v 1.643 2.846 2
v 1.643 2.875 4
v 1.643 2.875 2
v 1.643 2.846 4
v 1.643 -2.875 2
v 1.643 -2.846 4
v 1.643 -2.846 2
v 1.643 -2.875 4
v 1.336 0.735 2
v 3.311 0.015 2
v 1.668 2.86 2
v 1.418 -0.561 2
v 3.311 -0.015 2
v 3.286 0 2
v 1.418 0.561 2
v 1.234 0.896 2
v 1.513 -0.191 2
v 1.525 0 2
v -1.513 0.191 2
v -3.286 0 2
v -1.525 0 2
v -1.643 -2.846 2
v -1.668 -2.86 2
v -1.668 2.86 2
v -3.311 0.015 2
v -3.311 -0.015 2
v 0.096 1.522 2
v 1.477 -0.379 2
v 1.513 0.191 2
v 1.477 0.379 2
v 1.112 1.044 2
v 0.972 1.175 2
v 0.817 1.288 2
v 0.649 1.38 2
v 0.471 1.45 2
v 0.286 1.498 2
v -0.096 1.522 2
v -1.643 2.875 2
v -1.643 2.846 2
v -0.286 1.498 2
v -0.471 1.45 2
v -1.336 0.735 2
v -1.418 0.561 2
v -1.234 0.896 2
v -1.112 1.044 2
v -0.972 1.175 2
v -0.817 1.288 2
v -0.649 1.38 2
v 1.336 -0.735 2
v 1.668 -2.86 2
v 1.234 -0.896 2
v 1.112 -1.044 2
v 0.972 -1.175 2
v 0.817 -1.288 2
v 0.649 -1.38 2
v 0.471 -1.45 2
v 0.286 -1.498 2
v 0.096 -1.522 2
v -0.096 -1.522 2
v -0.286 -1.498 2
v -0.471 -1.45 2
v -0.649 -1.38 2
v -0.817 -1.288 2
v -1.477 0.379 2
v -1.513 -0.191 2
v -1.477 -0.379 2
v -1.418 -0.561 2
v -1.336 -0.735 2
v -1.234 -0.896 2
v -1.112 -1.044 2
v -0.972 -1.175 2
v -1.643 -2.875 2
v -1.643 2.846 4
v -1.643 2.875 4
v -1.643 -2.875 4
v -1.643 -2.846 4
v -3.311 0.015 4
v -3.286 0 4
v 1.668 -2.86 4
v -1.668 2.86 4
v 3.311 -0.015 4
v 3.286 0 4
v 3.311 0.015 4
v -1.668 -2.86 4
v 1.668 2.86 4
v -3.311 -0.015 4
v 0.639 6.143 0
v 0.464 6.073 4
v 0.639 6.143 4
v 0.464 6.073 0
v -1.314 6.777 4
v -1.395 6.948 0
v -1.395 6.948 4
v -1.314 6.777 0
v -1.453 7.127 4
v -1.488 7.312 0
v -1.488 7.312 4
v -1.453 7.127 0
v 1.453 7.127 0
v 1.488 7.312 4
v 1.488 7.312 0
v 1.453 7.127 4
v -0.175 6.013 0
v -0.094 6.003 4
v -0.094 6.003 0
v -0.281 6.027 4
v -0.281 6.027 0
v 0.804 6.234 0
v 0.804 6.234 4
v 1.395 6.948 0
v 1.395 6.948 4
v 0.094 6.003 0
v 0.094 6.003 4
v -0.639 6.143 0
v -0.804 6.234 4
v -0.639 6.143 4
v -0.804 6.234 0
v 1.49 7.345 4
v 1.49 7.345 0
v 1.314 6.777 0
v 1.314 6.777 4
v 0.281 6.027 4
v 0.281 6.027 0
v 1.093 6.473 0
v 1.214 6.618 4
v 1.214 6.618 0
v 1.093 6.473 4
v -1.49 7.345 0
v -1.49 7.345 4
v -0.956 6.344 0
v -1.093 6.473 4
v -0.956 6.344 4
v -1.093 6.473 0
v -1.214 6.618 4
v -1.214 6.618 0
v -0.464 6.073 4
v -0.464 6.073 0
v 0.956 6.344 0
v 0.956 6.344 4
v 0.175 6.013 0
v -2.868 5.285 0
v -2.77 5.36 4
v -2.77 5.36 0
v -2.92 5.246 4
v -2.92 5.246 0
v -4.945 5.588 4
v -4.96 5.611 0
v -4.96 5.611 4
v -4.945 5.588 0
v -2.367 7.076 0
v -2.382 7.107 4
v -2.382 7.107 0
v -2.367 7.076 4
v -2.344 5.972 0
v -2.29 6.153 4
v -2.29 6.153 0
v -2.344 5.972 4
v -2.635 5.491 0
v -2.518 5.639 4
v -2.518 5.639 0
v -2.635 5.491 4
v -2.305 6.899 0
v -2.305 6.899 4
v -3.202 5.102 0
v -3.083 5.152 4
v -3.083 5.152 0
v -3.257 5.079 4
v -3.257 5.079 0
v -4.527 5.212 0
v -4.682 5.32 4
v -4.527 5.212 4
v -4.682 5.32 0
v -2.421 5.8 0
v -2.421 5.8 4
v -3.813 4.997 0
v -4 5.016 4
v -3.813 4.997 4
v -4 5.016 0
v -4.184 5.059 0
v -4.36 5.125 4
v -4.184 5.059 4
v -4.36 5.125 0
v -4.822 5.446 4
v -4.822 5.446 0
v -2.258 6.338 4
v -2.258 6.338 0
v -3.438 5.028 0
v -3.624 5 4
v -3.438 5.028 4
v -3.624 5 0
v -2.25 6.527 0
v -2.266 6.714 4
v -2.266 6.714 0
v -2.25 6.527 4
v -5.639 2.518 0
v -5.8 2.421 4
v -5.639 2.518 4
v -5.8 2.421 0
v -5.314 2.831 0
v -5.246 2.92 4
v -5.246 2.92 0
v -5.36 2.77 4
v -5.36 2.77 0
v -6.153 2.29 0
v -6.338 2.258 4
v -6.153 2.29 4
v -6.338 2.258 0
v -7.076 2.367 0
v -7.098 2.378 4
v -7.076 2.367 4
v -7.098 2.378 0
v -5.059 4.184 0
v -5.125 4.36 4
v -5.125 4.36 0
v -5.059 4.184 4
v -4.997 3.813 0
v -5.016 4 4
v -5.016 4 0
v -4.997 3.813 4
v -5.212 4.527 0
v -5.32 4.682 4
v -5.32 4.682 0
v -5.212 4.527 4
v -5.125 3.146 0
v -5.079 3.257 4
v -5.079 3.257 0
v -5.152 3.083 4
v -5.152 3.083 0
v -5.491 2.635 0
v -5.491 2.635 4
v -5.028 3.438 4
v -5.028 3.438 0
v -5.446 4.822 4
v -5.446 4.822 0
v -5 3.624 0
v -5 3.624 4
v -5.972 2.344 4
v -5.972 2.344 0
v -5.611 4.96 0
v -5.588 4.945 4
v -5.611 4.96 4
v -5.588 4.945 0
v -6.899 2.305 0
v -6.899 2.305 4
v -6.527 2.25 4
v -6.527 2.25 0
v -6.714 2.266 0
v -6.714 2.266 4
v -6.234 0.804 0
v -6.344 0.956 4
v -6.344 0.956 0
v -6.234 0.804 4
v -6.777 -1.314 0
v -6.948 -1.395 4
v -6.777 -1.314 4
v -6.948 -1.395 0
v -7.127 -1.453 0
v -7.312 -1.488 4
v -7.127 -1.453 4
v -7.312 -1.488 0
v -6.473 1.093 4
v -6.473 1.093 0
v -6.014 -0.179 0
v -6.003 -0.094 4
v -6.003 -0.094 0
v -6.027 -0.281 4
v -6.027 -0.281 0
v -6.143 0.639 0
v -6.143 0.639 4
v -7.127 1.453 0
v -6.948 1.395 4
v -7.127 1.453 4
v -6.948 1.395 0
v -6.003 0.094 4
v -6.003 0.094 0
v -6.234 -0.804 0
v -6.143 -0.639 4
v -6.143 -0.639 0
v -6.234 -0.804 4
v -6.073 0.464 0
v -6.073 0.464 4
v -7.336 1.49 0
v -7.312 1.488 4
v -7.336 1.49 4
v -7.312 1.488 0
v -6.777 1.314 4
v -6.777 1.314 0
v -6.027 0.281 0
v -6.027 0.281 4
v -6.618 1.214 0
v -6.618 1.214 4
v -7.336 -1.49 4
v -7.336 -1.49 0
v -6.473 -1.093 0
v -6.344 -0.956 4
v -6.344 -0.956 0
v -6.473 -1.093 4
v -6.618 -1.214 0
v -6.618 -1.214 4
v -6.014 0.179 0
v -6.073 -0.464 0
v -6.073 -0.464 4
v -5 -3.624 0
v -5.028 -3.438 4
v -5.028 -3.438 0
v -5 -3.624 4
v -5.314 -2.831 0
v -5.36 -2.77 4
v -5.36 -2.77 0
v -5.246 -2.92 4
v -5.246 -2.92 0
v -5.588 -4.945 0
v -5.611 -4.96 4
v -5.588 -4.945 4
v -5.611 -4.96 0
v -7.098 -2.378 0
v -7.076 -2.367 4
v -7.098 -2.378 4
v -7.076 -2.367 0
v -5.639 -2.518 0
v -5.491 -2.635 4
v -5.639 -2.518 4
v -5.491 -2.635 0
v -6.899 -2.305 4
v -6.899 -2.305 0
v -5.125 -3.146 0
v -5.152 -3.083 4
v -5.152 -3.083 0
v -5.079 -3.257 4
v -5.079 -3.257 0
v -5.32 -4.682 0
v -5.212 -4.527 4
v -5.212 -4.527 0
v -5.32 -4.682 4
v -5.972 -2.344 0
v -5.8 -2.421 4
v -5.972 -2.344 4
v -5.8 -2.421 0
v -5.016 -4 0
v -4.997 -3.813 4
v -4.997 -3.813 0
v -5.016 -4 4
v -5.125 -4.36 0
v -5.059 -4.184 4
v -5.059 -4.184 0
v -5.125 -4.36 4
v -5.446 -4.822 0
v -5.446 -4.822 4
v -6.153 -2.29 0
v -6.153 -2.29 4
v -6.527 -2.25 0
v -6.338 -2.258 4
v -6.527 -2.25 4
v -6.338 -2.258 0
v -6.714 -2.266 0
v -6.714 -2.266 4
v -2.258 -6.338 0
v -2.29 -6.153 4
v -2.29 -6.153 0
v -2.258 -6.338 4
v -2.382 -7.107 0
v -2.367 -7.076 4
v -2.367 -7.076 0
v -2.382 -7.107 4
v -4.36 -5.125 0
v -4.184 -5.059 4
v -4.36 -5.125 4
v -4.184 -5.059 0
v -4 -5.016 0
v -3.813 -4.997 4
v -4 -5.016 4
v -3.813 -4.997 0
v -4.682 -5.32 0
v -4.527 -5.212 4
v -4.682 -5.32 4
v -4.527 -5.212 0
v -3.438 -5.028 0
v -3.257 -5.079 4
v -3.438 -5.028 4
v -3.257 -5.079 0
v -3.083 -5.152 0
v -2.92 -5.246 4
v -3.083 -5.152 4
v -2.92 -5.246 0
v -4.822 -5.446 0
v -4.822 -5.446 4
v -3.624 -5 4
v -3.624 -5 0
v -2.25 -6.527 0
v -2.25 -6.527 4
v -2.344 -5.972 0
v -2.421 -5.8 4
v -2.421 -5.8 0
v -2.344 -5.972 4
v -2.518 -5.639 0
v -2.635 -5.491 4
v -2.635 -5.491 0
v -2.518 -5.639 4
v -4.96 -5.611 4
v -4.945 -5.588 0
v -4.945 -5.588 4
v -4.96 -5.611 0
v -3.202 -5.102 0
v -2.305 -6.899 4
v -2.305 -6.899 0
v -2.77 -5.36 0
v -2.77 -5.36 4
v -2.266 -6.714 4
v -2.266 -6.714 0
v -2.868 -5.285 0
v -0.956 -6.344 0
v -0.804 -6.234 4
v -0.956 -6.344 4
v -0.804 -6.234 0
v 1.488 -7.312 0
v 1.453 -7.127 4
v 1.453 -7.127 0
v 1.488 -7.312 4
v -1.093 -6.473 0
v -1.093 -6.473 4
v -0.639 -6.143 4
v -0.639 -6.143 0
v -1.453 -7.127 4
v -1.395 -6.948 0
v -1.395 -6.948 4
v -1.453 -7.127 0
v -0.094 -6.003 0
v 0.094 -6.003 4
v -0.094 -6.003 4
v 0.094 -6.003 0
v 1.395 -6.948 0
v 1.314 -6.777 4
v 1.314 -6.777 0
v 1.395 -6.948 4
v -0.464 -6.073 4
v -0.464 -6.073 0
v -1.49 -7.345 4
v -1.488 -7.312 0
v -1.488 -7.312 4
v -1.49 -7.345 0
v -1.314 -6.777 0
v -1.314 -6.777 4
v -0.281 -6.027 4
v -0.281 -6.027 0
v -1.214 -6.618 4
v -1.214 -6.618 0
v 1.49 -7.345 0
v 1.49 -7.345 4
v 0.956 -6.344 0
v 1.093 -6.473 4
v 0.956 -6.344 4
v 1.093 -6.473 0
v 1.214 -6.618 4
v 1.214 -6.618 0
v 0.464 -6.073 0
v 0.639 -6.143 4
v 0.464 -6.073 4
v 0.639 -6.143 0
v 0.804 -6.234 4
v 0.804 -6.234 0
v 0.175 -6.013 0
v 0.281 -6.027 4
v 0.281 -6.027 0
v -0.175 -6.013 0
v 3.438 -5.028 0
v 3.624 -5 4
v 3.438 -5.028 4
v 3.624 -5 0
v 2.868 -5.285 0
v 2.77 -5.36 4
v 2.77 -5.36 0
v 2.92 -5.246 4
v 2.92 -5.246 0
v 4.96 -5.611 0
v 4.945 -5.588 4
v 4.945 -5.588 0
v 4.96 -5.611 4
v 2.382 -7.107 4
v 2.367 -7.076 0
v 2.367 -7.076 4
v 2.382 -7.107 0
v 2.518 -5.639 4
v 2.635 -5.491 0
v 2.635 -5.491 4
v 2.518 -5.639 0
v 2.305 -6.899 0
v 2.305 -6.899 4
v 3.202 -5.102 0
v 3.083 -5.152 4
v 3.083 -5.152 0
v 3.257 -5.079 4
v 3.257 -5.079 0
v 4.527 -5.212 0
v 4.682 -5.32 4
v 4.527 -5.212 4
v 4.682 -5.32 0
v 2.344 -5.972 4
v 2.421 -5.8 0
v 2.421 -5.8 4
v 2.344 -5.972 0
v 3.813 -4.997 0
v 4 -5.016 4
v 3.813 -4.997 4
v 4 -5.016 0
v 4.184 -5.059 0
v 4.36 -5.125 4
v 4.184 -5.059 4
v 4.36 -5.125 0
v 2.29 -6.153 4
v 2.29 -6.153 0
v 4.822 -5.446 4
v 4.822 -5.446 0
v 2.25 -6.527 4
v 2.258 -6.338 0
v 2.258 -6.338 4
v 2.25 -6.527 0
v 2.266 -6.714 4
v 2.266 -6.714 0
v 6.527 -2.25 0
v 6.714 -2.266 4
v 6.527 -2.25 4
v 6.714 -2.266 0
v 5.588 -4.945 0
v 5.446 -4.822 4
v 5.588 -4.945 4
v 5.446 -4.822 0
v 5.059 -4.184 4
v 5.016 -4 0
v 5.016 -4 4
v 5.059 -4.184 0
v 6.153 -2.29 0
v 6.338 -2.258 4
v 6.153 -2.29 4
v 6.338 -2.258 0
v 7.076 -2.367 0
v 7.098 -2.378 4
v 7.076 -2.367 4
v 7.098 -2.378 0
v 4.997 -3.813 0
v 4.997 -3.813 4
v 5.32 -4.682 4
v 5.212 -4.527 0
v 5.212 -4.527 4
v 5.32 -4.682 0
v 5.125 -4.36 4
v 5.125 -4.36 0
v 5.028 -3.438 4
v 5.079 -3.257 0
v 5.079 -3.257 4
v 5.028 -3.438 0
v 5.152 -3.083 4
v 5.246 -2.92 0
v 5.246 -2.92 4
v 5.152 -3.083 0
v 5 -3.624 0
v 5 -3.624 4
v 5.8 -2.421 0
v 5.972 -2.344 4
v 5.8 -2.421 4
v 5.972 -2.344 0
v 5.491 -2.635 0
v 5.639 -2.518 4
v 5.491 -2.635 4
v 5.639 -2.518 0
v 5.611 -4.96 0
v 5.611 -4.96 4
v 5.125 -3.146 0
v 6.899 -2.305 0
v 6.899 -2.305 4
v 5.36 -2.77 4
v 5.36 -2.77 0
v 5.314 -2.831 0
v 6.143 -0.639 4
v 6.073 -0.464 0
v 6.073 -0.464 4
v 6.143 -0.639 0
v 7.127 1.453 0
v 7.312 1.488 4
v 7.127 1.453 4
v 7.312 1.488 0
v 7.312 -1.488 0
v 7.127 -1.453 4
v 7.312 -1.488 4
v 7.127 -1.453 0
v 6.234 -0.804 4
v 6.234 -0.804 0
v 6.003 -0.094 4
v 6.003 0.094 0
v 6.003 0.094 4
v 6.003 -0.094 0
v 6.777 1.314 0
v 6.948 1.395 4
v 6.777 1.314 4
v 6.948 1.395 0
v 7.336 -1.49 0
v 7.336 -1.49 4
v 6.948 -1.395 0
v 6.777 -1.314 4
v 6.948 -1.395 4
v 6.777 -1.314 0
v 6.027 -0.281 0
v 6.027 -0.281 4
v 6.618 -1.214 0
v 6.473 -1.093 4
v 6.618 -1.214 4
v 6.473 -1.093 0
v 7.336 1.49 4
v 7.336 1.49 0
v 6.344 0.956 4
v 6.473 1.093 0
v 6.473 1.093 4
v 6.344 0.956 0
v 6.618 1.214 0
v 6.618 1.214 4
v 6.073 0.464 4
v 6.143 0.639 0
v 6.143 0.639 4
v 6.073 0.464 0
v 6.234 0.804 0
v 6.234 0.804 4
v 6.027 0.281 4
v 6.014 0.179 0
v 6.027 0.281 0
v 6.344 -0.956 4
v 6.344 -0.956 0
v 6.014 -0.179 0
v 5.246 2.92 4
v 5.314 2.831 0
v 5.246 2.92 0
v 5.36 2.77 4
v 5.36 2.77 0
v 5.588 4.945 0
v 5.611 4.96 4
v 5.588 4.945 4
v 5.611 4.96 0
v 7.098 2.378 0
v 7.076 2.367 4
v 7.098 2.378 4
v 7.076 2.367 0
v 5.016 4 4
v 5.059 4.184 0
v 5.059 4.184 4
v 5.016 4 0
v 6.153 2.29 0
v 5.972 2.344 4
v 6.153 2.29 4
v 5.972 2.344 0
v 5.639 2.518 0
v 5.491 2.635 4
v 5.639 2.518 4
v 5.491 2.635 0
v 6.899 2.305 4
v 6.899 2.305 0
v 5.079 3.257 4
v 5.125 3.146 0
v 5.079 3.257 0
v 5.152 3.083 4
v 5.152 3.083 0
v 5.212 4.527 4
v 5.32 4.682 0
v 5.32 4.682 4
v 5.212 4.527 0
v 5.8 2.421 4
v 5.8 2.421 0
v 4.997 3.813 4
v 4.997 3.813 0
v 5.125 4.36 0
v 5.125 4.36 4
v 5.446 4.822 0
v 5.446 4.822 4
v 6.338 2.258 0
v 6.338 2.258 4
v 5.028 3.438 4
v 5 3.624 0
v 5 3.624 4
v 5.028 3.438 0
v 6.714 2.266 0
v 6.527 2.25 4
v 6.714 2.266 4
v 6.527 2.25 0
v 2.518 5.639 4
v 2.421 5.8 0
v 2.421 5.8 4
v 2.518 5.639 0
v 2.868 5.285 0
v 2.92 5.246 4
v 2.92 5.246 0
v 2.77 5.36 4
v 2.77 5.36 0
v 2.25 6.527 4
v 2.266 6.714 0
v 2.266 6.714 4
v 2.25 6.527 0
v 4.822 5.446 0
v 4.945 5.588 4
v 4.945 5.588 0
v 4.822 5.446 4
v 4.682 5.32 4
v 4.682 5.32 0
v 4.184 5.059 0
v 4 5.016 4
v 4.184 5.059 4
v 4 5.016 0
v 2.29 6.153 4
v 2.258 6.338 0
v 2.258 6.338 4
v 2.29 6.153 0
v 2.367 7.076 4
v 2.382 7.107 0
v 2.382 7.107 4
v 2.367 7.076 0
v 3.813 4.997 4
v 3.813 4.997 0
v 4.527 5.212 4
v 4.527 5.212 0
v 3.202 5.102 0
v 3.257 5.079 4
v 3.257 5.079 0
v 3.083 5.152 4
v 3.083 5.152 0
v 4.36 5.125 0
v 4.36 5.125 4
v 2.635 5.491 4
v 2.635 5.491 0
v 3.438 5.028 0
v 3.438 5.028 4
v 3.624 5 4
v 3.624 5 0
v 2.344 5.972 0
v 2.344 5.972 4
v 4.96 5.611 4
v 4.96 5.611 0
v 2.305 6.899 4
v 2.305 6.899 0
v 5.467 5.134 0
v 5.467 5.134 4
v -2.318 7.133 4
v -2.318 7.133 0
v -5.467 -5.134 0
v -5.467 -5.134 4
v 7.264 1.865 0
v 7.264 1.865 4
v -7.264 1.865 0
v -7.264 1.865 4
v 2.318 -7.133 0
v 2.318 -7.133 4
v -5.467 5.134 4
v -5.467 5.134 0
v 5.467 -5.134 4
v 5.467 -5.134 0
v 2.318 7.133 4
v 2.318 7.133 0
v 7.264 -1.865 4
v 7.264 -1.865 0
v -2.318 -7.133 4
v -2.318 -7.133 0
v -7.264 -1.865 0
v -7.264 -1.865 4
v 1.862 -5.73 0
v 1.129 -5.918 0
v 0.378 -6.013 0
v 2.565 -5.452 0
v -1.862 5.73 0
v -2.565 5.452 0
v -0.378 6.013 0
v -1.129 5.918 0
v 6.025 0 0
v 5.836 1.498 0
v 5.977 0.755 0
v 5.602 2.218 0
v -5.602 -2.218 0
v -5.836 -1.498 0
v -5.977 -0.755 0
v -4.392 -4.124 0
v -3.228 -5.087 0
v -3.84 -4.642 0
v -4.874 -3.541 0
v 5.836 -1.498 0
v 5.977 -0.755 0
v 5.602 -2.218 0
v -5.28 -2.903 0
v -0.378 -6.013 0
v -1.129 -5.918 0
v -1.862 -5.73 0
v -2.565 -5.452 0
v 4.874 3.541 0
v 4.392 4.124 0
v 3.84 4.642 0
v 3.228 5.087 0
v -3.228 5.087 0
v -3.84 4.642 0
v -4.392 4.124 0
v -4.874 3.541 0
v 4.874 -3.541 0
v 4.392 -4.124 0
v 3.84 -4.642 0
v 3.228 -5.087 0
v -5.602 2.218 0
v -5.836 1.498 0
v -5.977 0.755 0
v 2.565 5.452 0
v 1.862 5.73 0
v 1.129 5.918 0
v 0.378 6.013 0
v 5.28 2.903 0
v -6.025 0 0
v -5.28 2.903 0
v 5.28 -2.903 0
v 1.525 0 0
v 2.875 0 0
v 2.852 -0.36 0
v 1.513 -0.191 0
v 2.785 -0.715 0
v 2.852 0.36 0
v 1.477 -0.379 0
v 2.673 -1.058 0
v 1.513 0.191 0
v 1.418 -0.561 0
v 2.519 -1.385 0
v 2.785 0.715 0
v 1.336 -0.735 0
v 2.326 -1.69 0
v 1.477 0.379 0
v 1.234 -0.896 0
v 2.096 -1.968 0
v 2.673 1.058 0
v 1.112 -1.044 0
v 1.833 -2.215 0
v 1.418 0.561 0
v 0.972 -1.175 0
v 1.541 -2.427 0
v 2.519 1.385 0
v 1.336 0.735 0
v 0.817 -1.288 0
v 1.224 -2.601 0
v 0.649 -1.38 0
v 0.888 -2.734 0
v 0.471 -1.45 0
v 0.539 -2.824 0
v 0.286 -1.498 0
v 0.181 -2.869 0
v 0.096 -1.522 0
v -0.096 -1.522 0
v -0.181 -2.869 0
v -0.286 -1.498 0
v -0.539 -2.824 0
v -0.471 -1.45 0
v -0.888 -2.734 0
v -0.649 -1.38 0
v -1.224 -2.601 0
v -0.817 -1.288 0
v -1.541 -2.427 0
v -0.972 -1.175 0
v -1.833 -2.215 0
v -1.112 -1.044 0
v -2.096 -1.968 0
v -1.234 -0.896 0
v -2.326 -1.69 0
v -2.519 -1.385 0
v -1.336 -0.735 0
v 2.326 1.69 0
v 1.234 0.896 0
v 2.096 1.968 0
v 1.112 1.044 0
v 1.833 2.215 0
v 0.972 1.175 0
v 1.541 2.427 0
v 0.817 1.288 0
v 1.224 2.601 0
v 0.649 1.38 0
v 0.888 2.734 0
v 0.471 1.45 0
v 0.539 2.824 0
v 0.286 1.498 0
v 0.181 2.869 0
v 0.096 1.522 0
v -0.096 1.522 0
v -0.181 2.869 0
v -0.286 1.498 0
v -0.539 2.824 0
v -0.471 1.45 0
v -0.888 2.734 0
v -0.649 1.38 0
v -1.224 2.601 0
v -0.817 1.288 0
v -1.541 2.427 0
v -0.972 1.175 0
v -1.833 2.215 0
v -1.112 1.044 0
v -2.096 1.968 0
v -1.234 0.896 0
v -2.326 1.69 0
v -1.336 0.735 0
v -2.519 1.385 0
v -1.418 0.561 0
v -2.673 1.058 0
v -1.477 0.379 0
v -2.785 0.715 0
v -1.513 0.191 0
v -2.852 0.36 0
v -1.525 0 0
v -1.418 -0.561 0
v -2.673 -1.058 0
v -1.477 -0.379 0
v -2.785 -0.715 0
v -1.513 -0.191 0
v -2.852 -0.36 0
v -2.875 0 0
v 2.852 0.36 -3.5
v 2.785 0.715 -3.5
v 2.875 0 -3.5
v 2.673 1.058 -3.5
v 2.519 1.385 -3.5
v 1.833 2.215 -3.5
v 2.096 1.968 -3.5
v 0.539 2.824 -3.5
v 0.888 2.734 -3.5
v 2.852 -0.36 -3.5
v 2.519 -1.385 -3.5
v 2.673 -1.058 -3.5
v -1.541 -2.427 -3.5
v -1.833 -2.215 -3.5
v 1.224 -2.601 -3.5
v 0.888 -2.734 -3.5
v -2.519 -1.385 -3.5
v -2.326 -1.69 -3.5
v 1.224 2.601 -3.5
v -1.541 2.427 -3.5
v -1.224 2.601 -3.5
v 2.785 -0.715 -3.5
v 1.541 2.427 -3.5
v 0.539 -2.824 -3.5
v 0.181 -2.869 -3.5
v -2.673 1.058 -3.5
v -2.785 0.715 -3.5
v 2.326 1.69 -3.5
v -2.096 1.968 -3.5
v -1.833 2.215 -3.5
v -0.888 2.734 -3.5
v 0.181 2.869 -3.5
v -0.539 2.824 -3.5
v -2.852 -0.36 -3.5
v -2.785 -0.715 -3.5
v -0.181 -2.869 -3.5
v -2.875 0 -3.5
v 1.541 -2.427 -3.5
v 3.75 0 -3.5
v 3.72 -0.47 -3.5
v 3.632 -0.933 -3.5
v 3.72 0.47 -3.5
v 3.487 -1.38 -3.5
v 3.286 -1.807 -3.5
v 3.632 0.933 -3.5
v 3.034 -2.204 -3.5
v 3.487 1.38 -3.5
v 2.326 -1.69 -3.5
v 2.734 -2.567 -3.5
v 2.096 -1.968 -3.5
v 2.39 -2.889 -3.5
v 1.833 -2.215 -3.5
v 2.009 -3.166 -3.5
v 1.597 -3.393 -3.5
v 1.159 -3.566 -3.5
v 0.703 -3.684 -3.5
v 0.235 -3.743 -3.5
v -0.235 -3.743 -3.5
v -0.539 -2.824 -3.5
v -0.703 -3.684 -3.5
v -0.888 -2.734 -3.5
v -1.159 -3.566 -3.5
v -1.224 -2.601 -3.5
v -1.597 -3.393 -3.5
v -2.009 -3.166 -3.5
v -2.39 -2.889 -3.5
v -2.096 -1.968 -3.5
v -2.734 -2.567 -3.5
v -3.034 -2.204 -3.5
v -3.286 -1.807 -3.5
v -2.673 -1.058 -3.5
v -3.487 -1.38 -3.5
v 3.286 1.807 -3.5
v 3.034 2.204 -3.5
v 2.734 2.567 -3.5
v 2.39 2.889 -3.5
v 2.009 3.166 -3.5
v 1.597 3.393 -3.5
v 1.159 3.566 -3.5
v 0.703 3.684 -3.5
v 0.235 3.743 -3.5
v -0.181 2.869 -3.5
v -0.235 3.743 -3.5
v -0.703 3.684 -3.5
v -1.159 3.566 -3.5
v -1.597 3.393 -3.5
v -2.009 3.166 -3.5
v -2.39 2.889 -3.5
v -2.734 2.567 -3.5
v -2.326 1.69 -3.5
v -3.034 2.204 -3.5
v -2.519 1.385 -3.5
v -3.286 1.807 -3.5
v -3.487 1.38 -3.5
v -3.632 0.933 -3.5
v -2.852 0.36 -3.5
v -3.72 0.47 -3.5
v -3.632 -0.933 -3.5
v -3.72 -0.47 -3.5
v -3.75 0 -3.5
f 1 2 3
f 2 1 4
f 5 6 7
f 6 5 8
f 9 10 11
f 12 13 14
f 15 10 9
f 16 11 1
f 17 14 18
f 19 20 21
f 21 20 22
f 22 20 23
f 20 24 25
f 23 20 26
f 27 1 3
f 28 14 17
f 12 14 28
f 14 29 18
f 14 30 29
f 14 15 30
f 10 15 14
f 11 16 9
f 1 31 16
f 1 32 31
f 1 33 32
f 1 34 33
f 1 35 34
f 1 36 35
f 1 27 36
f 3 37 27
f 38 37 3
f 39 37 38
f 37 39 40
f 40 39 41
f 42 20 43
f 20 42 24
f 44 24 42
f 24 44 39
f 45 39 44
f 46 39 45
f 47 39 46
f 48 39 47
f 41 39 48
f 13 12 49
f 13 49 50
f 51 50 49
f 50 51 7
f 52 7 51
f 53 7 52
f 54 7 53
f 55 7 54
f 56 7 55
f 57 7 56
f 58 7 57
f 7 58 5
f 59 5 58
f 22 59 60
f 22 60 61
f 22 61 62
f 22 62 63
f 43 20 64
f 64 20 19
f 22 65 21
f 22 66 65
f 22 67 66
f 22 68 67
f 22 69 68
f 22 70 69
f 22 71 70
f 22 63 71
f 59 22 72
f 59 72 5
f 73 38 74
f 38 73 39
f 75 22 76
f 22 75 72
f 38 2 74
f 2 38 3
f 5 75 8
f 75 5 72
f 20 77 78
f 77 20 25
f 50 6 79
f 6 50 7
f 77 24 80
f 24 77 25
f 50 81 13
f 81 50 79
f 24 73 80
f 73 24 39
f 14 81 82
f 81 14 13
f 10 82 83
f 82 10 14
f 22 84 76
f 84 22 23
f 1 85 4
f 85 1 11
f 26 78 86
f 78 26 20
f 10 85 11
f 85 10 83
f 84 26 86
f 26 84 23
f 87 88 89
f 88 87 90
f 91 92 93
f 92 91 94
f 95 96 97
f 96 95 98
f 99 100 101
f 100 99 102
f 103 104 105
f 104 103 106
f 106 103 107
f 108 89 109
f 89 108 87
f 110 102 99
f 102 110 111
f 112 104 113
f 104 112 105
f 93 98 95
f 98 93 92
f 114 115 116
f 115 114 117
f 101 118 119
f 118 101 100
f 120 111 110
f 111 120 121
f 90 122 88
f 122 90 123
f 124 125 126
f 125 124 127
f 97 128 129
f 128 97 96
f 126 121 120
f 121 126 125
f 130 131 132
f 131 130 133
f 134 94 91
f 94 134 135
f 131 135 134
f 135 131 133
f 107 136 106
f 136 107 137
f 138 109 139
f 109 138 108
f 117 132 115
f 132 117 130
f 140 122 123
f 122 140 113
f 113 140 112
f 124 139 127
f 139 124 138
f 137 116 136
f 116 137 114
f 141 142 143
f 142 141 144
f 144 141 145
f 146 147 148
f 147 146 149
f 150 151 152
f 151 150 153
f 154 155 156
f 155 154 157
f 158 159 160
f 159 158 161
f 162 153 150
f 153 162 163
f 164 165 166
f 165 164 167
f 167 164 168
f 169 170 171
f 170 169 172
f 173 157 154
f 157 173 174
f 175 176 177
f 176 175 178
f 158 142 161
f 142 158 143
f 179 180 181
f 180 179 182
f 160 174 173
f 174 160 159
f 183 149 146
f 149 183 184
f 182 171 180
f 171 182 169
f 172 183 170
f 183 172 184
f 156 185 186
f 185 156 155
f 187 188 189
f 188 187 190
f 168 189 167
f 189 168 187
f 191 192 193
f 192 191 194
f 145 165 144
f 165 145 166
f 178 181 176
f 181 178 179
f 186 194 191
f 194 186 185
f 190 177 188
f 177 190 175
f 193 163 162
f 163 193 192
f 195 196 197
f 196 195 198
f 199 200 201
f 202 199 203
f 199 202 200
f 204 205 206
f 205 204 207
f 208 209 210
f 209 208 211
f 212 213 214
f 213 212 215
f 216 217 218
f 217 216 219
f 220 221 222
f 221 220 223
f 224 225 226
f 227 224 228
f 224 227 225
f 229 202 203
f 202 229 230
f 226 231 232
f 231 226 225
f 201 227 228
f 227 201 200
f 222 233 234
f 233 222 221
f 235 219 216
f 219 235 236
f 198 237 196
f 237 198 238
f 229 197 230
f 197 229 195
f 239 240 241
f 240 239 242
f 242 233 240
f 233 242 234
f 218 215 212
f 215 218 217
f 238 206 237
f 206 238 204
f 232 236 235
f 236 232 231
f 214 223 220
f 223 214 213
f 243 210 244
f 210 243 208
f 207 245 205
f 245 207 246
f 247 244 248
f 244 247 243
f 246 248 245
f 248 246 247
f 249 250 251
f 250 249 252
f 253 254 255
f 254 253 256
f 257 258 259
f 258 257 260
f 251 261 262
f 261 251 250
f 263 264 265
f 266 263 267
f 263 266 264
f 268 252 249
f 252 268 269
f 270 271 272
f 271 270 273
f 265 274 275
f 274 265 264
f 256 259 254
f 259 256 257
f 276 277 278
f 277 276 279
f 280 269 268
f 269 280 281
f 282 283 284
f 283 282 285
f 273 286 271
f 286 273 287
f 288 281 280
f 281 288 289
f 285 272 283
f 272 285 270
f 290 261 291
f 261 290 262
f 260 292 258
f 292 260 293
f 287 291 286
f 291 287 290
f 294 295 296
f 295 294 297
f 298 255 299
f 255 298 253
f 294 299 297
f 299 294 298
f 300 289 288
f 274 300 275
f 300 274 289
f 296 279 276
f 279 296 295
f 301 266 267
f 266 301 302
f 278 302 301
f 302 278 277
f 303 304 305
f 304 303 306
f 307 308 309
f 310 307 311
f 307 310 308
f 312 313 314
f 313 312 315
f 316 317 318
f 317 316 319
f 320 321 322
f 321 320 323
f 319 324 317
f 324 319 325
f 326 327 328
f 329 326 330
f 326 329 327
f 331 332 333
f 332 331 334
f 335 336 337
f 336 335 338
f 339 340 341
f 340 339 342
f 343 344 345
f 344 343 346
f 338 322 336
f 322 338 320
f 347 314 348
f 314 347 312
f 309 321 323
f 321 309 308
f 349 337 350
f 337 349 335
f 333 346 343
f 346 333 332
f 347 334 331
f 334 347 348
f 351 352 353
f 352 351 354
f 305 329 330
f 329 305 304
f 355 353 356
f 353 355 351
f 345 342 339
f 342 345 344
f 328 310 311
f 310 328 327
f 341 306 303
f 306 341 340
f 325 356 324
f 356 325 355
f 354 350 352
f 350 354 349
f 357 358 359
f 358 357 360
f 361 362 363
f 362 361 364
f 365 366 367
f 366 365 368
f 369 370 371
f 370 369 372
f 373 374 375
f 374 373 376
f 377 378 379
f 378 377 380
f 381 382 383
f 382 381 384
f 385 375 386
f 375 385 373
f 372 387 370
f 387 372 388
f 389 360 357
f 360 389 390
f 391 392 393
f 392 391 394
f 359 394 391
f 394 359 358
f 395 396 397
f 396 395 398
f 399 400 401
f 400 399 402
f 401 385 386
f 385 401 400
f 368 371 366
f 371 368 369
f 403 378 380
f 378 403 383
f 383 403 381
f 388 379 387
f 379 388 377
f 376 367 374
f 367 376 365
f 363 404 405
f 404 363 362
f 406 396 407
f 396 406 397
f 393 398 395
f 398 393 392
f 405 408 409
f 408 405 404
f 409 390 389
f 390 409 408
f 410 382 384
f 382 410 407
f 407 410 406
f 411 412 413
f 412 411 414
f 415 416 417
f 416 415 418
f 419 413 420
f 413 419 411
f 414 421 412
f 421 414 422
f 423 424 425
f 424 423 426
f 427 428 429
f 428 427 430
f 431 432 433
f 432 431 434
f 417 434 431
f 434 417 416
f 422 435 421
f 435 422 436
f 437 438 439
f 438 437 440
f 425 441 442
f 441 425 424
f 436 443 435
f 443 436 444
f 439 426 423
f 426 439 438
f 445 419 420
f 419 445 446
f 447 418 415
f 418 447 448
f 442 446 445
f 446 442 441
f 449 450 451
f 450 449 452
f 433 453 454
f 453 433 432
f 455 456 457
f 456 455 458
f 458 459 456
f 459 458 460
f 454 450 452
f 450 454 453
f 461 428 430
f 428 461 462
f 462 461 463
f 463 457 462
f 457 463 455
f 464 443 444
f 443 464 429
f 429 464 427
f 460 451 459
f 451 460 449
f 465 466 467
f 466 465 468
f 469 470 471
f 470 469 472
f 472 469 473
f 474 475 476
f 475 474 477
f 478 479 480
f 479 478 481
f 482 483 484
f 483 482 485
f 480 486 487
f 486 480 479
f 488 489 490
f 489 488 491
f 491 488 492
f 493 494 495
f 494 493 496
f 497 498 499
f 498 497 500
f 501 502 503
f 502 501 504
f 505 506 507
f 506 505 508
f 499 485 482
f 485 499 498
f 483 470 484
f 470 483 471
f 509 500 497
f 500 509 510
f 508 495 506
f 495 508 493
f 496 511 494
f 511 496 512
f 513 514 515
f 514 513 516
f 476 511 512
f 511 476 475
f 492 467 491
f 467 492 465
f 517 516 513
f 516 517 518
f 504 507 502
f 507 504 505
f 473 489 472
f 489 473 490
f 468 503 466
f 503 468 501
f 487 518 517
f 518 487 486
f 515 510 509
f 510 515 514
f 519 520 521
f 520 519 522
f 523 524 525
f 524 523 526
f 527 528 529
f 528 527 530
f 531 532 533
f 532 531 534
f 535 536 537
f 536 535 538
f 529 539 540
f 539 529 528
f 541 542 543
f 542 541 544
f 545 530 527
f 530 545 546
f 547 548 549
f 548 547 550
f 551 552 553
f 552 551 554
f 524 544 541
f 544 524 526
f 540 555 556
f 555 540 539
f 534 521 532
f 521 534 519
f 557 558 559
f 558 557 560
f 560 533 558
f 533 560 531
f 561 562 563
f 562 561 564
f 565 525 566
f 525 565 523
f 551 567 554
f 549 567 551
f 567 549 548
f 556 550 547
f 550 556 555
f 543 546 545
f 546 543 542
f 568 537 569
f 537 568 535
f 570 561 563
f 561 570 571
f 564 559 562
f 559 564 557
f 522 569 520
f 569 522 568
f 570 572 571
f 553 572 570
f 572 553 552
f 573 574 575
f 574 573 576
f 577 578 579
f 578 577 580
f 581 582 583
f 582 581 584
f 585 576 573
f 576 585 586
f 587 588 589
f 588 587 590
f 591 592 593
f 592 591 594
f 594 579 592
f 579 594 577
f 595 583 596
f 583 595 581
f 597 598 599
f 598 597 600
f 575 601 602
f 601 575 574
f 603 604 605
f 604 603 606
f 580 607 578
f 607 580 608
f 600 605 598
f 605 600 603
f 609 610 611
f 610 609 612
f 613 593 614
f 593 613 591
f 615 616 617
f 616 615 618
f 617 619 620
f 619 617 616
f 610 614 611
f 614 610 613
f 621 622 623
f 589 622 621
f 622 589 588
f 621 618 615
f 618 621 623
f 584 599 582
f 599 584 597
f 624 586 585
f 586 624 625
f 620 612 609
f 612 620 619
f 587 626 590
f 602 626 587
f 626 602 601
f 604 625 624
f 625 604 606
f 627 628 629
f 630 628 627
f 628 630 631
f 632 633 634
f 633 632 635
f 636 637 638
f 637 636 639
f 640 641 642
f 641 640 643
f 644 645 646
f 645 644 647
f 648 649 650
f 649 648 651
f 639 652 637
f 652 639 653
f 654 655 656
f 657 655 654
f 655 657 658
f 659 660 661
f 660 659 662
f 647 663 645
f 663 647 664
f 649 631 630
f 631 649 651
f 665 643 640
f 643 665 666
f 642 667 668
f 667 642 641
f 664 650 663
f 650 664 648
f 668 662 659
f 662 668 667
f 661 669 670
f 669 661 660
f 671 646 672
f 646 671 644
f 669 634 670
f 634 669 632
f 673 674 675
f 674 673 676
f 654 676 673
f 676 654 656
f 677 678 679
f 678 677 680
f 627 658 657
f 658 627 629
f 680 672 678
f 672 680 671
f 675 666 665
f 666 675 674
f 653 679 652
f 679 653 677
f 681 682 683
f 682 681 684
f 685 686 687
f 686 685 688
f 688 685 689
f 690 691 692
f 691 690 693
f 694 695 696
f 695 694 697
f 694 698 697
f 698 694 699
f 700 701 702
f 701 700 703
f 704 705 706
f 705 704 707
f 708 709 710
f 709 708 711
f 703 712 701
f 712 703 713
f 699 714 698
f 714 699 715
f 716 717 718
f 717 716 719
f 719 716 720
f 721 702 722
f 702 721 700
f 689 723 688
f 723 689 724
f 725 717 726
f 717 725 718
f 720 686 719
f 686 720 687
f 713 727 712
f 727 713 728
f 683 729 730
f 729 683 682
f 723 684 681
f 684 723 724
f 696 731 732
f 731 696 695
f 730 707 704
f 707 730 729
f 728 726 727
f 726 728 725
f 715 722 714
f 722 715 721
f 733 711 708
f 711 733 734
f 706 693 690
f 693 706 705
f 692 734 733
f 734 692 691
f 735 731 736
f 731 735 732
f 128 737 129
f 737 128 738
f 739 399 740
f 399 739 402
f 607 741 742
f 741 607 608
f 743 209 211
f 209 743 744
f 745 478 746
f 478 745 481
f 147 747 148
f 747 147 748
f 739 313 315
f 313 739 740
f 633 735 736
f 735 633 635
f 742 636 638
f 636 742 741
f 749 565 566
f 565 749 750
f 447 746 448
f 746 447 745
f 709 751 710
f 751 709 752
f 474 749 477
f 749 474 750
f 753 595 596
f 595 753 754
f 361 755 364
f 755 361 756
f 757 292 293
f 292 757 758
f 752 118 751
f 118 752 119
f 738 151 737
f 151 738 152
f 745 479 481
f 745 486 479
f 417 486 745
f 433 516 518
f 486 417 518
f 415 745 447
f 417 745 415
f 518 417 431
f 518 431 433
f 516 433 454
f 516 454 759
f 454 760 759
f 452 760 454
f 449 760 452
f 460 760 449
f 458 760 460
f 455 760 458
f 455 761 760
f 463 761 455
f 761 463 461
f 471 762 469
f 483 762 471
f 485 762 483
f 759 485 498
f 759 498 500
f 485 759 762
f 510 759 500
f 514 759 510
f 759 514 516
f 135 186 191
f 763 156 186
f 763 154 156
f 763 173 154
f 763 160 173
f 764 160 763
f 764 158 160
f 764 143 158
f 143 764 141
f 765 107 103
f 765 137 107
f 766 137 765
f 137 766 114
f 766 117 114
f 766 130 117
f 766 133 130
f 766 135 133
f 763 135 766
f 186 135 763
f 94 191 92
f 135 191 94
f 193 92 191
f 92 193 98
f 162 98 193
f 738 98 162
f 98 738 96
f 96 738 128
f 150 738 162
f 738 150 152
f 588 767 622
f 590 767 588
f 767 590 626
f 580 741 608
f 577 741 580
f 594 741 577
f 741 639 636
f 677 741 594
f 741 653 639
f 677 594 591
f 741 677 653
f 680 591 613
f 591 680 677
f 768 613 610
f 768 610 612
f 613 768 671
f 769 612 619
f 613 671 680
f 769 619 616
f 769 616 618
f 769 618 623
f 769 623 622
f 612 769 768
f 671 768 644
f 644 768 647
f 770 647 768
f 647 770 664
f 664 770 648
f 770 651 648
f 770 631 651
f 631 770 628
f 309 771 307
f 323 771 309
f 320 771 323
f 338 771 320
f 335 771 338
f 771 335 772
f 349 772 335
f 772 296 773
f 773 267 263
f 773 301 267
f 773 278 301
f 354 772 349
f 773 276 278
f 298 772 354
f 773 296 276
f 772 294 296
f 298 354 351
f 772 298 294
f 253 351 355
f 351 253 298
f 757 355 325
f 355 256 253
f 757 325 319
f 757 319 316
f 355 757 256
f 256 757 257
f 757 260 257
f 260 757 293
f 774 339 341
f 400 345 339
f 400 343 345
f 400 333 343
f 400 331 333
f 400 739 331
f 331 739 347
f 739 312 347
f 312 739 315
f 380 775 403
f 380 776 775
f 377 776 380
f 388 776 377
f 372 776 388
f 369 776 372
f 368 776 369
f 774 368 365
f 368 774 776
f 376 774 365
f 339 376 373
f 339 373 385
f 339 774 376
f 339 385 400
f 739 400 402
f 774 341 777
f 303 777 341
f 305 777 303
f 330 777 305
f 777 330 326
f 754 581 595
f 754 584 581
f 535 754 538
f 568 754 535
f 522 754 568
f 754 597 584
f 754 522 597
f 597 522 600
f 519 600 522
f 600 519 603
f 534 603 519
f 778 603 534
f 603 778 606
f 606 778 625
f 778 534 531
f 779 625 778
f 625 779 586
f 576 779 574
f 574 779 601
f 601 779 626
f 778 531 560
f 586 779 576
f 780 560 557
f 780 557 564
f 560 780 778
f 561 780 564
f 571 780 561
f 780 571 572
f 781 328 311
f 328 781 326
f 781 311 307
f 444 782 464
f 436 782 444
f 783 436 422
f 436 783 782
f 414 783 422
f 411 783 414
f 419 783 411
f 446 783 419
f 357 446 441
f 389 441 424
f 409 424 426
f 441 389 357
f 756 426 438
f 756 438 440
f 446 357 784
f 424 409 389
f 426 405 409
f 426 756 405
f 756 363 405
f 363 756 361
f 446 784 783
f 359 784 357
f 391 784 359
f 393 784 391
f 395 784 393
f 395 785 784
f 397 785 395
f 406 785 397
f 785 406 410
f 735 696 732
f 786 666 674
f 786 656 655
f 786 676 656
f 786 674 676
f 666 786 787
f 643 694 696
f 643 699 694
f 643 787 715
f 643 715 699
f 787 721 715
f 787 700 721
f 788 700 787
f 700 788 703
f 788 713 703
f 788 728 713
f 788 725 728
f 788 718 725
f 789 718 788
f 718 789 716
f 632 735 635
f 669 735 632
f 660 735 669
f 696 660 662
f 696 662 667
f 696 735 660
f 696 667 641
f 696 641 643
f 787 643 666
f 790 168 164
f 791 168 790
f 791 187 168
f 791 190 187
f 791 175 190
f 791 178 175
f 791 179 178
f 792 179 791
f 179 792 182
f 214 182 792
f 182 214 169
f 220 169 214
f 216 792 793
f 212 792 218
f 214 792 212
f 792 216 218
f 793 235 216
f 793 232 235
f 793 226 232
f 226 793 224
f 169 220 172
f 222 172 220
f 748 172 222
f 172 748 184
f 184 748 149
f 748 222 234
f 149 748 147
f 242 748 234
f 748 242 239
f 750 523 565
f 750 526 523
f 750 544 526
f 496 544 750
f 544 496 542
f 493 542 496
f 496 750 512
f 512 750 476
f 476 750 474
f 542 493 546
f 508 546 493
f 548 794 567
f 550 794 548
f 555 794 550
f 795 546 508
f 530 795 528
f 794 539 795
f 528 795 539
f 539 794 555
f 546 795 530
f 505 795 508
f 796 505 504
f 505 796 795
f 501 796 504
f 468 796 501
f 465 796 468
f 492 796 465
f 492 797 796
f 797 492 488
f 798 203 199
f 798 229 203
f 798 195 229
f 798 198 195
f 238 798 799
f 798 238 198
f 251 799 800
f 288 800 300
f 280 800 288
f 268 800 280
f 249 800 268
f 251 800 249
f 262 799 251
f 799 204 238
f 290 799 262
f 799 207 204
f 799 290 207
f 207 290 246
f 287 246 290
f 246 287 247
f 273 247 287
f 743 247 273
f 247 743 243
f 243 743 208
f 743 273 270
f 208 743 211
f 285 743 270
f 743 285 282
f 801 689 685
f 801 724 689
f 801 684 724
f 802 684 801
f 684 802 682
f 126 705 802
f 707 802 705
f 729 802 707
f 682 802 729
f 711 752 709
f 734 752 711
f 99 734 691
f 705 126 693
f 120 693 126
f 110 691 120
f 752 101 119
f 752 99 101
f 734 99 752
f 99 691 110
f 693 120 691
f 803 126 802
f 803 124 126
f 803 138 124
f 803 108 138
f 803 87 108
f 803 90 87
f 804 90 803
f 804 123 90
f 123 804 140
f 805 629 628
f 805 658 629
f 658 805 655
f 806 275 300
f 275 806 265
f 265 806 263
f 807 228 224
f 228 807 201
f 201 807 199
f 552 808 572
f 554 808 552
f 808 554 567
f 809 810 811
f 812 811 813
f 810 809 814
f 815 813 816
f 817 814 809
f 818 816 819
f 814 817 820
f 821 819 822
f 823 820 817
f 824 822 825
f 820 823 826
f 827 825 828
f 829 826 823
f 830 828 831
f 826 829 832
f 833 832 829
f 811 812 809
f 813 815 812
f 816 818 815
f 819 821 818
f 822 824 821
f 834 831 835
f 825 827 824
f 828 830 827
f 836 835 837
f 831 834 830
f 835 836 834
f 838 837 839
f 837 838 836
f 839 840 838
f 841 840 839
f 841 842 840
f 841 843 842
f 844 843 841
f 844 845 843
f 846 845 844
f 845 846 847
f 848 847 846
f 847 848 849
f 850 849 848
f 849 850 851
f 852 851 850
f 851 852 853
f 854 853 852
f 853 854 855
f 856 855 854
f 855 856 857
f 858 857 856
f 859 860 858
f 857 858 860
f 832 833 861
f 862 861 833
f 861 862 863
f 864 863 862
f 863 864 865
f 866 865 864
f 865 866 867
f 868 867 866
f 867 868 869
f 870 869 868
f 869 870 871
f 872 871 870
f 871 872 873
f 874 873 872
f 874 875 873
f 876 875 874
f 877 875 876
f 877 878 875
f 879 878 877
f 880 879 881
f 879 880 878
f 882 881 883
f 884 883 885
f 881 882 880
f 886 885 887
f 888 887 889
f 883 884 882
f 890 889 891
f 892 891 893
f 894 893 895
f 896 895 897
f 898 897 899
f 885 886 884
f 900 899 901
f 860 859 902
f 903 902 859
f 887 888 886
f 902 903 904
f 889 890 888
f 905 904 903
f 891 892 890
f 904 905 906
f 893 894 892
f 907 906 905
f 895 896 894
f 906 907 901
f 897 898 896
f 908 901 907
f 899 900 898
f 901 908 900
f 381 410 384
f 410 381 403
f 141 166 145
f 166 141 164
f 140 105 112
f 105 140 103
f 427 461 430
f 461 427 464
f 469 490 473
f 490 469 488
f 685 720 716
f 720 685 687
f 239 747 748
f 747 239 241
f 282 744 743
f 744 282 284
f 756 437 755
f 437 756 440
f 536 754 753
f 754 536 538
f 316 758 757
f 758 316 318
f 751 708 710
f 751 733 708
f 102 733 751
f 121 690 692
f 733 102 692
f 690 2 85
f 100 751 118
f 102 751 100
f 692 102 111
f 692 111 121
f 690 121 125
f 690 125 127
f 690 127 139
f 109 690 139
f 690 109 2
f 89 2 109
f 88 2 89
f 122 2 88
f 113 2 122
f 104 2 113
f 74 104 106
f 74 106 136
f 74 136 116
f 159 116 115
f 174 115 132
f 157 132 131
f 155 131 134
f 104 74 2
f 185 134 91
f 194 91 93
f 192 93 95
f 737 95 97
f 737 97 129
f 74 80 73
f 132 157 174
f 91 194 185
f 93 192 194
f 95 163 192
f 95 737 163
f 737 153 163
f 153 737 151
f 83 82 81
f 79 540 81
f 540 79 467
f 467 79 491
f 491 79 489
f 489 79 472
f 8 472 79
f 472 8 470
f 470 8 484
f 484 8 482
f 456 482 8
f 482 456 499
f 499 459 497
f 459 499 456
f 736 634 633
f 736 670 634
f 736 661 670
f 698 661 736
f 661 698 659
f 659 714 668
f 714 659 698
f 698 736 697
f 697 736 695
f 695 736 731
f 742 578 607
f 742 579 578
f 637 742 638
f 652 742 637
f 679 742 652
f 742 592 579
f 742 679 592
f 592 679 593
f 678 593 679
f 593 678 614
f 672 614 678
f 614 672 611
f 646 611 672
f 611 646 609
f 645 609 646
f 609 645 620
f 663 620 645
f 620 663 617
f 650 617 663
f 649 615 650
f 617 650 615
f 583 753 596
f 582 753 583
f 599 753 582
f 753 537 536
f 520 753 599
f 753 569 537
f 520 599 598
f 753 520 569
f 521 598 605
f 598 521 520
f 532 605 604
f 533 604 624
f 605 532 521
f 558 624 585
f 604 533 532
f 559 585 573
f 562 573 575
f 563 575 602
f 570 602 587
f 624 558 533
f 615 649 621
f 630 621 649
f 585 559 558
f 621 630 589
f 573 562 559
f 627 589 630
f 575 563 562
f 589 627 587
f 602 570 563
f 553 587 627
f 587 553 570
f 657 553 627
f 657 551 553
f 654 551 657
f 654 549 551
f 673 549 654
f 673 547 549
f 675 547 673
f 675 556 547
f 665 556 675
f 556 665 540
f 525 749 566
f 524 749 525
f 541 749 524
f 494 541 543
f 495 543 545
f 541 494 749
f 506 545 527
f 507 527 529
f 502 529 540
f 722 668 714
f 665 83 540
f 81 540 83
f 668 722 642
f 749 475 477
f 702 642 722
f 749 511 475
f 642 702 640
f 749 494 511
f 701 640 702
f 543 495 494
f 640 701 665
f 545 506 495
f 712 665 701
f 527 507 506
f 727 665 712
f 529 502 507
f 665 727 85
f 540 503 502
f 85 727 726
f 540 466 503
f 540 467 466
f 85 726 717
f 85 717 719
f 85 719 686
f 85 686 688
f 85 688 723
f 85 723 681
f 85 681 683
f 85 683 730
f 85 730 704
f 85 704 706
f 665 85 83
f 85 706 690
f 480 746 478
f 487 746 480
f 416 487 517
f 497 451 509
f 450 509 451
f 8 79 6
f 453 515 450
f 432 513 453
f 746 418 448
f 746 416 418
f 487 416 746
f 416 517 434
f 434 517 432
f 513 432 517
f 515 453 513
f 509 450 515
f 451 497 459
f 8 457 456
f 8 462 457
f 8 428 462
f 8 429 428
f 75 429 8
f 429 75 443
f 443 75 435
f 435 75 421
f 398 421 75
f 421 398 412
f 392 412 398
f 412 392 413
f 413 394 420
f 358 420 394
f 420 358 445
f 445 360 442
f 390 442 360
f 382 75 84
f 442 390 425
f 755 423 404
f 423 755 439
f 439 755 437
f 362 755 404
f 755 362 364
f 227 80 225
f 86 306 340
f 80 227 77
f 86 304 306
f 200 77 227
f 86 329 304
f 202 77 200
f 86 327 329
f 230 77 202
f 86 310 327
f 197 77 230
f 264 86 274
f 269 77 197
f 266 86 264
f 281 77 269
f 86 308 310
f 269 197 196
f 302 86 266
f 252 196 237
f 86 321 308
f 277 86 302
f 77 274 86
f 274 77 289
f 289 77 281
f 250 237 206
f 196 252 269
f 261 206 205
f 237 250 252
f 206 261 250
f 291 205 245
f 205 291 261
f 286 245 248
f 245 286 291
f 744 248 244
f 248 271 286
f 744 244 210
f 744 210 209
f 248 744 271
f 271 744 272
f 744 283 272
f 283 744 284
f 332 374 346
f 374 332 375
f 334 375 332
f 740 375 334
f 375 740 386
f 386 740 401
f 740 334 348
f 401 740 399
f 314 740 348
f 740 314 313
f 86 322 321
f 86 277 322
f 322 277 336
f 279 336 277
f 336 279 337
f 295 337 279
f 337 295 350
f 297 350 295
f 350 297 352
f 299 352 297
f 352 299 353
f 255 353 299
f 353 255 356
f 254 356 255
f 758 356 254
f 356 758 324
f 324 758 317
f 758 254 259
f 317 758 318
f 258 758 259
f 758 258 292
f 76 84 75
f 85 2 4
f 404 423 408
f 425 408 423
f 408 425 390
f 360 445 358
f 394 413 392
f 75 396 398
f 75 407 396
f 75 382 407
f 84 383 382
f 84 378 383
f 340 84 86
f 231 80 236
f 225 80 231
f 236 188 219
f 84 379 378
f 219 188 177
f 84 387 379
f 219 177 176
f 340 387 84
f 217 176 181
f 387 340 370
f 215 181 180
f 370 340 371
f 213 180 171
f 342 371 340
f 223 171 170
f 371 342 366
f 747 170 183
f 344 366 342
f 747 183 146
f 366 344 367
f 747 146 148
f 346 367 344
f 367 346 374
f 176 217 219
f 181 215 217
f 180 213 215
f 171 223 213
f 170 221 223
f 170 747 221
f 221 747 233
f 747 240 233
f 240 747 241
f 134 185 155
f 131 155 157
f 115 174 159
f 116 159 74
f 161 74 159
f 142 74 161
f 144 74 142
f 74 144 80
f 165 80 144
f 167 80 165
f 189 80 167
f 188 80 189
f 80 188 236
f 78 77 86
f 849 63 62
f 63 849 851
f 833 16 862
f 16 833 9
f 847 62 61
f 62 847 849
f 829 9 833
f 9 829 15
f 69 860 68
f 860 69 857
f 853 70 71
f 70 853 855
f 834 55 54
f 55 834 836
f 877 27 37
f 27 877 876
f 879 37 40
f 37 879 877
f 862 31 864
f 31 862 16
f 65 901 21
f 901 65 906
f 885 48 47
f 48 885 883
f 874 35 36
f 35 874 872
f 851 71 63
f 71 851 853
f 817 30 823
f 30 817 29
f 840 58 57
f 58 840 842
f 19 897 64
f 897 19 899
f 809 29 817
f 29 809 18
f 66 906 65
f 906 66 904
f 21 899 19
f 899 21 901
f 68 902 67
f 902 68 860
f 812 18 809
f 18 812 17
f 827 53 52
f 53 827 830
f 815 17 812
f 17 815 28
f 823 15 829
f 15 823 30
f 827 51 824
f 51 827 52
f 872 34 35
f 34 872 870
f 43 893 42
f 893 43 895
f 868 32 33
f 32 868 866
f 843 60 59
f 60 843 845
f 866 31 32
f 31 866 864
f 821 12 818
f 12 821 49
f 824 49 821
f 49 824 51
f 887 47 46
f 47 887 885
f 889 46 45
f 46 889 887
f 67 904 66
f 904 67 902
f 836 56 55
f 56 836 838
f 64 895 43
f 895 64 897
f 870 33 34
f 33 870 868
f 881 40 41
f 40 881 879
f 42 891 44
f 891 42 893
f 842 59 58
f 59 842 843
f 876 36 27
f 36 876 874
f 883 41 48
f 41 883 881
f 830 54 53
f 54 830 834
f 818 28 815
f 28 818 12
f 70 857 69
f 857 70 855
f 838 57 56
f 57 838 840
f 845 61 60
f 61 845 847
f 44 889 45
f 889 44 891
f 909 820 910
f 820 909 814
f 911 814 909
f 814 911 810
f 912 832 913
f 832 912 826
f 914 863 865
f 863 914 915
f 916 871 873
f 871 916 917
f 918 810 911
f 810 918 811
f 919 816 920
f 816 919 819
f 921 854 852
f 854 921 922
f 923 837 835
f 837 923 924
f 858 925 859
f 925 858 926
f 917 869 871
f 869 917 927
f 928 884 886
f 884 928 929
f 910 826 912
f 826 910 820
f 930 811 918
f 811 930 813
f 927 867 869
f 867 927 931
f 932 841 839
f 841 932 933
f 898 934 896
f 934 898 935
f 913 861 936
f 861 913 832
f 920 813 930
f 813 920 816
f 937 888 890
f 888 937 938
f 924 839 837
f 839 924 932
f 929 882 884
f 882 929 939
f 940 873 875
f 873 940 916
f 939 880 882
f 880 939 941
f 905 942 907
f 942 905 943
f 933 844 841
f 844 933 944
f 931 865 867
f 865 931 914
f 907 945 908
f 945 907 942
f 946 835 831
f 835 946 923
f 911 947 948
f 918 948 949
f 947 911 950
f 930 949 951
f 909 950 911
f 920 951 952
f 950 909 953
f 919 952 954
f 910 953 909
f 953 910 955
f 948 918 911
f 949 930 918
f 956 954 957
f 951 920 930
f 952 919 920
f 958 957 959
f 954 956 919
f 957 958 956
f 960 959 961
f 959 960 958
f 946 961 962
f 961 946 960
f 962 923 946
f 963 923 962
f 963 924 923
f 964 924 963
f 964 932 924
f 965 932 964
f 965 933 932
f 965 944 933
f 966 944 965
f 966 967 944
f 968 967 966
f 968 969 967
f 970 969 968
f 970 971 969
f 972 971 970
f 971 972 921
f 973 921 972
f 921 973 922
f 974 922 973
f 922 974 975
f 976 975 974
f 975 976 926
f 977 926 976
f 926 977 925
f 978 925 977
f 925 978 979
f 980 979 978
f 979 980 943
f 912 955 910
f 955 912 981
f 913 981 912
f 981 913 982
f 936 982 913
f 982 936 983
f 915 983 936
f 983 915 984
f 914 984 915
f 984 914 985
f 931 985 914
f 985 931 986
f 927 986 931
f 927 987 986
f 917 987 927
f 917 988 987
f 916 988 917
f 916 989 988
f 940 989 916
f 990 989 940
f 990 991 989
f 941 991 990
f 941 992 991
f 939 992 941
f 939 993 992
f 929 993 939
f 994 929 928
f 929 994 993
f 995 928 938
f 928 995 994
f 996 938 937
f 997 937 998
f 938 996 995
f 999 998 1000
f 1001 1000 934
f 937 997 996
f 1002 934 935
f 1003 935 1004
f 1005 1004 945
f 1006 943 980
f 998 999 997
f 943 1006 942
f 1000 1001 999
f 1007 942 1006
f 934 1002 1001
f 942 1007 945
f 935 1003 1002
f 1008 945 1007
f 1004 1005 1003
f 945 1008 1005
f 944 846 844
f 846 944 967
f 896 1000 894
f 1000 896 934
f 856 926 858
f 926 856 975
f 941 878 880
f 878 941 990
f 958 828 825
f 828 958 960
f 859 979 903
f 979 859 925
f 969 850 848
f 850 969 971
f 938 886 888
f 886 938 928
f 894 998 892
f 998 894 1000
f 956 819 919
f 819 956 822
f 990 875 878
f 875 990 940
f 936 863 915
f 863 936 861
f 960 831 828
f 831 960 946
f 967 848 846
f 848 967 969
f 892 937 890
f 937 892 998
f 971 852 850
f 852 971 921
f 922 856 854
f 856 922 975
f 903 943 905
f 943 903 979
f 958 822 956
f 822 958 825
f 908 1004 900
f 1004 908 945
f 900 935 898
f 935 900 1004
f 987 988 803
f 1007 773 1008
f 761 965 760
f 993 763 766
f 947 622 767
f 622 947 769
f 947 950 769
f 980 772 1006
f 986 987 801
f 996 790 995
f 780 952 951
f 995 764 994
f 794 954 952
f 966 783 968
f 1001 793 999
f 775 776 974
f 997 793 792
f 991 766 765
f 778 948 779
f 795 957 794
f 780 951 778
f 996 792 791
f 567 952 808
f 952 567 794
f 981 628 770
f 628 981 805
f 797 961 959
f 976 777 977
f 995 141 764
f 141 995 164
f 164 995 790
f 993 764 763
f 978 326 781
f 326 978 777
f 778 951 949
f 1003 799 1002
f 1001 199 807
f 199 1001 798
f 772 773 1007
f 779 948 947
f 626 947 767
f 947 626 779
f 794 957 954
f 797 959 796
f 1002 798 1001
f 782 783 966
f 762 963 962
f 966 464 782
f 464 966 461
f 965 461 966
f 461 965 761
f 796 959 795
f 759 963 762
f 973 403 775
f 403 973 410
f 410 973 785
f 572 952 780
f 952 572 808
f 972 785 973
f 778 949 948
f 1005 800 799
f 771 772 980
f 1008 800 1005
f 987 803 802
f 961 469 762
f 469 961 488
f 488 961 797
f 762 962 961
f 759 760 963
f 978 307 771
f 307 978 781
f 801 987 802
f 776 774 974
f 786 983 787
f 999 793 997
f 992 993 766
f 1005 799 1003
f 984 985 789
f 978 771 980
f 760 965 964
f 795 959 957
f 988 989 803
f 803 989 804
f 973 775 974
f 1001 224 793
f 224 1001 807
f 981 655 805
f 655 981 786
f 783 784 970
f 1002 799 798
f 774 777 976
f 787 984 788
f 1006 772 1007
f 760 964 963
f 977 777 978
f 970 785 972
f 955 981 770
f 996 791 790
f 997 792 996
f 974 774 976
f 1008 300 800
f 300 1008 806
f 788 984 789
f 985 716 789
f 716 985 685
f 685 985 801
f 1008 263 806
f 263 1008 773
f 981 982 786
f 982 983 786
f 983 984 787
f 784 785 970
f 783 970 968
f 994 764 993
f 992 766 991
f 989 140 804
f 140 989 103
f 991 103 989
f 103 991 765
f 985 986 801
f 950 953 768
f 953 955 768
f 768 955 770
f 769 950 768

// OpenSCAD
// ******************************
// *   Parametric thumb wheel   *
// *   by Chris Garrett         *
// *   20-nov-2011              *
// ******************************


// *** Configuration variables ***
wheel_d = 15;    // Outer Diameter of the thumb wheel
wheel_h = 4;     // Height of the thumb wheel
hole_d = 3.05;    // Diameter of center hole
hex_sz = 7*3/4+0.5;      // Size of the hex (nut trap)
                 // An M4 nut fits perfectly in a 7mm hex opening made on my Prusa
hex_d = 2;       // Depth of the hex (set this < or = to wheel_h)
knurl_cnt = 12;  // Number of cutouts around the wheel
knurl_d = 3;     // Diameter of the cutouts


// *** Code area ***

module box(w,h,d) {
 translate([0,0,d/2]) scale ([w,h,d]) cube(1, true);
}

module hexagon(height, depth) {
 boxWidth=height/1.75;
 union() {
  box(boxWidth, height, depth);
  rotate([0,0,60]) box(boxWidth, height, depth);
  rotate([0,0,-60]) box(boxWidth, height, depth);
 }
}


// The thumb wheel 

difference() {
 cylinder(h=wheel_h, r=wheel_d/2, $fn=50);
 translate([0,0,-1]) cylinder(h=wheel_h+2, r=hole_d/2, $fn=50);
 if (hex_d >= wheel_h) {
   translate([0,0,-1]) hexagon(height=hex_sz, depth=wheel_d+2);
 } else {
  translate([0,0,wheel_h-hex_d]) hexagon(height=hex_sz, depth=hex_d+1);
 }
 for(i = [0:knurl_cnt-1]) {
  rotate(v=[0,0,1], a=i*360/knurl_cnt) translate([0,wheel_d/2,-1]) cylinder(h=wheel_h+2, r=knurl_d/2, $fn=50);
 }
}


difference() 
  {
 translate([0,0,-wheel_h+0.5])
    cylinder(h=3.5, r2=wheel_d*3/8+0.4, r1=wheel_d*2/8,$fn=50);
    union(){
 translate([0,0,-wheel_h-2]) cylinder(h=wheel_h*2, r=hole_d/2, $fn=50);
 translate([0,0,-wheel_h+0.5])  cylinder(h=3.5, d=5.75,$fn=50);
    }
 }
